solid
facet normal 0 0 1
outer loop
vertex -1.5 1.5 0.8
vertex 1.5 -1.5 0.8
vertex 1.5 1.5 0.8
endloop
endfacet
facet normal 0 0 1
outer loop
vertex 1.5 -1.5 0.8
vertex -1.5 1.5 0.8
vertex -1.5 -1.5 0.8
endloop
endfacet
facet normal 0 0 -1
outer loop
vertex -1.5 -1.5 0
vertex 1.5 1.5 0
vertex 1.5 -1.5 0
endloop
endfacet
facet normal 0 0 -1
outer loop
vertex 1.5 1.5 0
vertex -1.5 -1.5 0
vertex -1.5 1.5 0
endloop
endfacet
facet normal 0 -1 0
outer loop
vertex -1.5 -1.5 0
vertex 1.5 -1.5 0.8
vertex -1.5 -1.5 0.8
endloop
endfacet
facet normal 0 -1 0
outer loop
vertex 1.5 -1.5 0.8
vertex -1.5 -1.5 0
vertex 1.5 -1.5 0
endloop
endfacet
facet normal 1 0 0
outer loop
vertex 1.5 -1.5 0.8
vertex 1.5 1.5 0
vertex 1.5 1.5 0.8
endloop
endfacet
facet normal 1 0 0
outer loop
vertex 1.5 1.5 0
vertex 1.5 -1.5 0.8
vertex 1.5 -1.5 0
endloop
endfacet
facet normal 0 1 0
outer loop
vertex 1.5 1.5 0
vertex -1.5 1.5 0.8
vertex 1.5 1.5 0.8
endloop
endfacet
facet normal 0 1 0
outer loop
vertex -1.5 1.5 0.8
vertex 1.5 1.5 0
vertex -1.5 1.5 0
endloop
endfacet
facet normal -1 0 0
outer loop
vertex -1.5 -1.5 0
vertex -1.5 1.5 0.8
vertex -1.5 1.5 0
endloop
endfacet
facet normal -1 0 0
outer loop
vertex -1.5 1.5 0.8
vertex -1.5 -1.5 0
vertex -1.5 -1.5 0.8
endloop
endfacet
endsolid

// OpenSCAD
color("black") translate([0,0,0.4]) cube([3,3,0.8], center=true);
